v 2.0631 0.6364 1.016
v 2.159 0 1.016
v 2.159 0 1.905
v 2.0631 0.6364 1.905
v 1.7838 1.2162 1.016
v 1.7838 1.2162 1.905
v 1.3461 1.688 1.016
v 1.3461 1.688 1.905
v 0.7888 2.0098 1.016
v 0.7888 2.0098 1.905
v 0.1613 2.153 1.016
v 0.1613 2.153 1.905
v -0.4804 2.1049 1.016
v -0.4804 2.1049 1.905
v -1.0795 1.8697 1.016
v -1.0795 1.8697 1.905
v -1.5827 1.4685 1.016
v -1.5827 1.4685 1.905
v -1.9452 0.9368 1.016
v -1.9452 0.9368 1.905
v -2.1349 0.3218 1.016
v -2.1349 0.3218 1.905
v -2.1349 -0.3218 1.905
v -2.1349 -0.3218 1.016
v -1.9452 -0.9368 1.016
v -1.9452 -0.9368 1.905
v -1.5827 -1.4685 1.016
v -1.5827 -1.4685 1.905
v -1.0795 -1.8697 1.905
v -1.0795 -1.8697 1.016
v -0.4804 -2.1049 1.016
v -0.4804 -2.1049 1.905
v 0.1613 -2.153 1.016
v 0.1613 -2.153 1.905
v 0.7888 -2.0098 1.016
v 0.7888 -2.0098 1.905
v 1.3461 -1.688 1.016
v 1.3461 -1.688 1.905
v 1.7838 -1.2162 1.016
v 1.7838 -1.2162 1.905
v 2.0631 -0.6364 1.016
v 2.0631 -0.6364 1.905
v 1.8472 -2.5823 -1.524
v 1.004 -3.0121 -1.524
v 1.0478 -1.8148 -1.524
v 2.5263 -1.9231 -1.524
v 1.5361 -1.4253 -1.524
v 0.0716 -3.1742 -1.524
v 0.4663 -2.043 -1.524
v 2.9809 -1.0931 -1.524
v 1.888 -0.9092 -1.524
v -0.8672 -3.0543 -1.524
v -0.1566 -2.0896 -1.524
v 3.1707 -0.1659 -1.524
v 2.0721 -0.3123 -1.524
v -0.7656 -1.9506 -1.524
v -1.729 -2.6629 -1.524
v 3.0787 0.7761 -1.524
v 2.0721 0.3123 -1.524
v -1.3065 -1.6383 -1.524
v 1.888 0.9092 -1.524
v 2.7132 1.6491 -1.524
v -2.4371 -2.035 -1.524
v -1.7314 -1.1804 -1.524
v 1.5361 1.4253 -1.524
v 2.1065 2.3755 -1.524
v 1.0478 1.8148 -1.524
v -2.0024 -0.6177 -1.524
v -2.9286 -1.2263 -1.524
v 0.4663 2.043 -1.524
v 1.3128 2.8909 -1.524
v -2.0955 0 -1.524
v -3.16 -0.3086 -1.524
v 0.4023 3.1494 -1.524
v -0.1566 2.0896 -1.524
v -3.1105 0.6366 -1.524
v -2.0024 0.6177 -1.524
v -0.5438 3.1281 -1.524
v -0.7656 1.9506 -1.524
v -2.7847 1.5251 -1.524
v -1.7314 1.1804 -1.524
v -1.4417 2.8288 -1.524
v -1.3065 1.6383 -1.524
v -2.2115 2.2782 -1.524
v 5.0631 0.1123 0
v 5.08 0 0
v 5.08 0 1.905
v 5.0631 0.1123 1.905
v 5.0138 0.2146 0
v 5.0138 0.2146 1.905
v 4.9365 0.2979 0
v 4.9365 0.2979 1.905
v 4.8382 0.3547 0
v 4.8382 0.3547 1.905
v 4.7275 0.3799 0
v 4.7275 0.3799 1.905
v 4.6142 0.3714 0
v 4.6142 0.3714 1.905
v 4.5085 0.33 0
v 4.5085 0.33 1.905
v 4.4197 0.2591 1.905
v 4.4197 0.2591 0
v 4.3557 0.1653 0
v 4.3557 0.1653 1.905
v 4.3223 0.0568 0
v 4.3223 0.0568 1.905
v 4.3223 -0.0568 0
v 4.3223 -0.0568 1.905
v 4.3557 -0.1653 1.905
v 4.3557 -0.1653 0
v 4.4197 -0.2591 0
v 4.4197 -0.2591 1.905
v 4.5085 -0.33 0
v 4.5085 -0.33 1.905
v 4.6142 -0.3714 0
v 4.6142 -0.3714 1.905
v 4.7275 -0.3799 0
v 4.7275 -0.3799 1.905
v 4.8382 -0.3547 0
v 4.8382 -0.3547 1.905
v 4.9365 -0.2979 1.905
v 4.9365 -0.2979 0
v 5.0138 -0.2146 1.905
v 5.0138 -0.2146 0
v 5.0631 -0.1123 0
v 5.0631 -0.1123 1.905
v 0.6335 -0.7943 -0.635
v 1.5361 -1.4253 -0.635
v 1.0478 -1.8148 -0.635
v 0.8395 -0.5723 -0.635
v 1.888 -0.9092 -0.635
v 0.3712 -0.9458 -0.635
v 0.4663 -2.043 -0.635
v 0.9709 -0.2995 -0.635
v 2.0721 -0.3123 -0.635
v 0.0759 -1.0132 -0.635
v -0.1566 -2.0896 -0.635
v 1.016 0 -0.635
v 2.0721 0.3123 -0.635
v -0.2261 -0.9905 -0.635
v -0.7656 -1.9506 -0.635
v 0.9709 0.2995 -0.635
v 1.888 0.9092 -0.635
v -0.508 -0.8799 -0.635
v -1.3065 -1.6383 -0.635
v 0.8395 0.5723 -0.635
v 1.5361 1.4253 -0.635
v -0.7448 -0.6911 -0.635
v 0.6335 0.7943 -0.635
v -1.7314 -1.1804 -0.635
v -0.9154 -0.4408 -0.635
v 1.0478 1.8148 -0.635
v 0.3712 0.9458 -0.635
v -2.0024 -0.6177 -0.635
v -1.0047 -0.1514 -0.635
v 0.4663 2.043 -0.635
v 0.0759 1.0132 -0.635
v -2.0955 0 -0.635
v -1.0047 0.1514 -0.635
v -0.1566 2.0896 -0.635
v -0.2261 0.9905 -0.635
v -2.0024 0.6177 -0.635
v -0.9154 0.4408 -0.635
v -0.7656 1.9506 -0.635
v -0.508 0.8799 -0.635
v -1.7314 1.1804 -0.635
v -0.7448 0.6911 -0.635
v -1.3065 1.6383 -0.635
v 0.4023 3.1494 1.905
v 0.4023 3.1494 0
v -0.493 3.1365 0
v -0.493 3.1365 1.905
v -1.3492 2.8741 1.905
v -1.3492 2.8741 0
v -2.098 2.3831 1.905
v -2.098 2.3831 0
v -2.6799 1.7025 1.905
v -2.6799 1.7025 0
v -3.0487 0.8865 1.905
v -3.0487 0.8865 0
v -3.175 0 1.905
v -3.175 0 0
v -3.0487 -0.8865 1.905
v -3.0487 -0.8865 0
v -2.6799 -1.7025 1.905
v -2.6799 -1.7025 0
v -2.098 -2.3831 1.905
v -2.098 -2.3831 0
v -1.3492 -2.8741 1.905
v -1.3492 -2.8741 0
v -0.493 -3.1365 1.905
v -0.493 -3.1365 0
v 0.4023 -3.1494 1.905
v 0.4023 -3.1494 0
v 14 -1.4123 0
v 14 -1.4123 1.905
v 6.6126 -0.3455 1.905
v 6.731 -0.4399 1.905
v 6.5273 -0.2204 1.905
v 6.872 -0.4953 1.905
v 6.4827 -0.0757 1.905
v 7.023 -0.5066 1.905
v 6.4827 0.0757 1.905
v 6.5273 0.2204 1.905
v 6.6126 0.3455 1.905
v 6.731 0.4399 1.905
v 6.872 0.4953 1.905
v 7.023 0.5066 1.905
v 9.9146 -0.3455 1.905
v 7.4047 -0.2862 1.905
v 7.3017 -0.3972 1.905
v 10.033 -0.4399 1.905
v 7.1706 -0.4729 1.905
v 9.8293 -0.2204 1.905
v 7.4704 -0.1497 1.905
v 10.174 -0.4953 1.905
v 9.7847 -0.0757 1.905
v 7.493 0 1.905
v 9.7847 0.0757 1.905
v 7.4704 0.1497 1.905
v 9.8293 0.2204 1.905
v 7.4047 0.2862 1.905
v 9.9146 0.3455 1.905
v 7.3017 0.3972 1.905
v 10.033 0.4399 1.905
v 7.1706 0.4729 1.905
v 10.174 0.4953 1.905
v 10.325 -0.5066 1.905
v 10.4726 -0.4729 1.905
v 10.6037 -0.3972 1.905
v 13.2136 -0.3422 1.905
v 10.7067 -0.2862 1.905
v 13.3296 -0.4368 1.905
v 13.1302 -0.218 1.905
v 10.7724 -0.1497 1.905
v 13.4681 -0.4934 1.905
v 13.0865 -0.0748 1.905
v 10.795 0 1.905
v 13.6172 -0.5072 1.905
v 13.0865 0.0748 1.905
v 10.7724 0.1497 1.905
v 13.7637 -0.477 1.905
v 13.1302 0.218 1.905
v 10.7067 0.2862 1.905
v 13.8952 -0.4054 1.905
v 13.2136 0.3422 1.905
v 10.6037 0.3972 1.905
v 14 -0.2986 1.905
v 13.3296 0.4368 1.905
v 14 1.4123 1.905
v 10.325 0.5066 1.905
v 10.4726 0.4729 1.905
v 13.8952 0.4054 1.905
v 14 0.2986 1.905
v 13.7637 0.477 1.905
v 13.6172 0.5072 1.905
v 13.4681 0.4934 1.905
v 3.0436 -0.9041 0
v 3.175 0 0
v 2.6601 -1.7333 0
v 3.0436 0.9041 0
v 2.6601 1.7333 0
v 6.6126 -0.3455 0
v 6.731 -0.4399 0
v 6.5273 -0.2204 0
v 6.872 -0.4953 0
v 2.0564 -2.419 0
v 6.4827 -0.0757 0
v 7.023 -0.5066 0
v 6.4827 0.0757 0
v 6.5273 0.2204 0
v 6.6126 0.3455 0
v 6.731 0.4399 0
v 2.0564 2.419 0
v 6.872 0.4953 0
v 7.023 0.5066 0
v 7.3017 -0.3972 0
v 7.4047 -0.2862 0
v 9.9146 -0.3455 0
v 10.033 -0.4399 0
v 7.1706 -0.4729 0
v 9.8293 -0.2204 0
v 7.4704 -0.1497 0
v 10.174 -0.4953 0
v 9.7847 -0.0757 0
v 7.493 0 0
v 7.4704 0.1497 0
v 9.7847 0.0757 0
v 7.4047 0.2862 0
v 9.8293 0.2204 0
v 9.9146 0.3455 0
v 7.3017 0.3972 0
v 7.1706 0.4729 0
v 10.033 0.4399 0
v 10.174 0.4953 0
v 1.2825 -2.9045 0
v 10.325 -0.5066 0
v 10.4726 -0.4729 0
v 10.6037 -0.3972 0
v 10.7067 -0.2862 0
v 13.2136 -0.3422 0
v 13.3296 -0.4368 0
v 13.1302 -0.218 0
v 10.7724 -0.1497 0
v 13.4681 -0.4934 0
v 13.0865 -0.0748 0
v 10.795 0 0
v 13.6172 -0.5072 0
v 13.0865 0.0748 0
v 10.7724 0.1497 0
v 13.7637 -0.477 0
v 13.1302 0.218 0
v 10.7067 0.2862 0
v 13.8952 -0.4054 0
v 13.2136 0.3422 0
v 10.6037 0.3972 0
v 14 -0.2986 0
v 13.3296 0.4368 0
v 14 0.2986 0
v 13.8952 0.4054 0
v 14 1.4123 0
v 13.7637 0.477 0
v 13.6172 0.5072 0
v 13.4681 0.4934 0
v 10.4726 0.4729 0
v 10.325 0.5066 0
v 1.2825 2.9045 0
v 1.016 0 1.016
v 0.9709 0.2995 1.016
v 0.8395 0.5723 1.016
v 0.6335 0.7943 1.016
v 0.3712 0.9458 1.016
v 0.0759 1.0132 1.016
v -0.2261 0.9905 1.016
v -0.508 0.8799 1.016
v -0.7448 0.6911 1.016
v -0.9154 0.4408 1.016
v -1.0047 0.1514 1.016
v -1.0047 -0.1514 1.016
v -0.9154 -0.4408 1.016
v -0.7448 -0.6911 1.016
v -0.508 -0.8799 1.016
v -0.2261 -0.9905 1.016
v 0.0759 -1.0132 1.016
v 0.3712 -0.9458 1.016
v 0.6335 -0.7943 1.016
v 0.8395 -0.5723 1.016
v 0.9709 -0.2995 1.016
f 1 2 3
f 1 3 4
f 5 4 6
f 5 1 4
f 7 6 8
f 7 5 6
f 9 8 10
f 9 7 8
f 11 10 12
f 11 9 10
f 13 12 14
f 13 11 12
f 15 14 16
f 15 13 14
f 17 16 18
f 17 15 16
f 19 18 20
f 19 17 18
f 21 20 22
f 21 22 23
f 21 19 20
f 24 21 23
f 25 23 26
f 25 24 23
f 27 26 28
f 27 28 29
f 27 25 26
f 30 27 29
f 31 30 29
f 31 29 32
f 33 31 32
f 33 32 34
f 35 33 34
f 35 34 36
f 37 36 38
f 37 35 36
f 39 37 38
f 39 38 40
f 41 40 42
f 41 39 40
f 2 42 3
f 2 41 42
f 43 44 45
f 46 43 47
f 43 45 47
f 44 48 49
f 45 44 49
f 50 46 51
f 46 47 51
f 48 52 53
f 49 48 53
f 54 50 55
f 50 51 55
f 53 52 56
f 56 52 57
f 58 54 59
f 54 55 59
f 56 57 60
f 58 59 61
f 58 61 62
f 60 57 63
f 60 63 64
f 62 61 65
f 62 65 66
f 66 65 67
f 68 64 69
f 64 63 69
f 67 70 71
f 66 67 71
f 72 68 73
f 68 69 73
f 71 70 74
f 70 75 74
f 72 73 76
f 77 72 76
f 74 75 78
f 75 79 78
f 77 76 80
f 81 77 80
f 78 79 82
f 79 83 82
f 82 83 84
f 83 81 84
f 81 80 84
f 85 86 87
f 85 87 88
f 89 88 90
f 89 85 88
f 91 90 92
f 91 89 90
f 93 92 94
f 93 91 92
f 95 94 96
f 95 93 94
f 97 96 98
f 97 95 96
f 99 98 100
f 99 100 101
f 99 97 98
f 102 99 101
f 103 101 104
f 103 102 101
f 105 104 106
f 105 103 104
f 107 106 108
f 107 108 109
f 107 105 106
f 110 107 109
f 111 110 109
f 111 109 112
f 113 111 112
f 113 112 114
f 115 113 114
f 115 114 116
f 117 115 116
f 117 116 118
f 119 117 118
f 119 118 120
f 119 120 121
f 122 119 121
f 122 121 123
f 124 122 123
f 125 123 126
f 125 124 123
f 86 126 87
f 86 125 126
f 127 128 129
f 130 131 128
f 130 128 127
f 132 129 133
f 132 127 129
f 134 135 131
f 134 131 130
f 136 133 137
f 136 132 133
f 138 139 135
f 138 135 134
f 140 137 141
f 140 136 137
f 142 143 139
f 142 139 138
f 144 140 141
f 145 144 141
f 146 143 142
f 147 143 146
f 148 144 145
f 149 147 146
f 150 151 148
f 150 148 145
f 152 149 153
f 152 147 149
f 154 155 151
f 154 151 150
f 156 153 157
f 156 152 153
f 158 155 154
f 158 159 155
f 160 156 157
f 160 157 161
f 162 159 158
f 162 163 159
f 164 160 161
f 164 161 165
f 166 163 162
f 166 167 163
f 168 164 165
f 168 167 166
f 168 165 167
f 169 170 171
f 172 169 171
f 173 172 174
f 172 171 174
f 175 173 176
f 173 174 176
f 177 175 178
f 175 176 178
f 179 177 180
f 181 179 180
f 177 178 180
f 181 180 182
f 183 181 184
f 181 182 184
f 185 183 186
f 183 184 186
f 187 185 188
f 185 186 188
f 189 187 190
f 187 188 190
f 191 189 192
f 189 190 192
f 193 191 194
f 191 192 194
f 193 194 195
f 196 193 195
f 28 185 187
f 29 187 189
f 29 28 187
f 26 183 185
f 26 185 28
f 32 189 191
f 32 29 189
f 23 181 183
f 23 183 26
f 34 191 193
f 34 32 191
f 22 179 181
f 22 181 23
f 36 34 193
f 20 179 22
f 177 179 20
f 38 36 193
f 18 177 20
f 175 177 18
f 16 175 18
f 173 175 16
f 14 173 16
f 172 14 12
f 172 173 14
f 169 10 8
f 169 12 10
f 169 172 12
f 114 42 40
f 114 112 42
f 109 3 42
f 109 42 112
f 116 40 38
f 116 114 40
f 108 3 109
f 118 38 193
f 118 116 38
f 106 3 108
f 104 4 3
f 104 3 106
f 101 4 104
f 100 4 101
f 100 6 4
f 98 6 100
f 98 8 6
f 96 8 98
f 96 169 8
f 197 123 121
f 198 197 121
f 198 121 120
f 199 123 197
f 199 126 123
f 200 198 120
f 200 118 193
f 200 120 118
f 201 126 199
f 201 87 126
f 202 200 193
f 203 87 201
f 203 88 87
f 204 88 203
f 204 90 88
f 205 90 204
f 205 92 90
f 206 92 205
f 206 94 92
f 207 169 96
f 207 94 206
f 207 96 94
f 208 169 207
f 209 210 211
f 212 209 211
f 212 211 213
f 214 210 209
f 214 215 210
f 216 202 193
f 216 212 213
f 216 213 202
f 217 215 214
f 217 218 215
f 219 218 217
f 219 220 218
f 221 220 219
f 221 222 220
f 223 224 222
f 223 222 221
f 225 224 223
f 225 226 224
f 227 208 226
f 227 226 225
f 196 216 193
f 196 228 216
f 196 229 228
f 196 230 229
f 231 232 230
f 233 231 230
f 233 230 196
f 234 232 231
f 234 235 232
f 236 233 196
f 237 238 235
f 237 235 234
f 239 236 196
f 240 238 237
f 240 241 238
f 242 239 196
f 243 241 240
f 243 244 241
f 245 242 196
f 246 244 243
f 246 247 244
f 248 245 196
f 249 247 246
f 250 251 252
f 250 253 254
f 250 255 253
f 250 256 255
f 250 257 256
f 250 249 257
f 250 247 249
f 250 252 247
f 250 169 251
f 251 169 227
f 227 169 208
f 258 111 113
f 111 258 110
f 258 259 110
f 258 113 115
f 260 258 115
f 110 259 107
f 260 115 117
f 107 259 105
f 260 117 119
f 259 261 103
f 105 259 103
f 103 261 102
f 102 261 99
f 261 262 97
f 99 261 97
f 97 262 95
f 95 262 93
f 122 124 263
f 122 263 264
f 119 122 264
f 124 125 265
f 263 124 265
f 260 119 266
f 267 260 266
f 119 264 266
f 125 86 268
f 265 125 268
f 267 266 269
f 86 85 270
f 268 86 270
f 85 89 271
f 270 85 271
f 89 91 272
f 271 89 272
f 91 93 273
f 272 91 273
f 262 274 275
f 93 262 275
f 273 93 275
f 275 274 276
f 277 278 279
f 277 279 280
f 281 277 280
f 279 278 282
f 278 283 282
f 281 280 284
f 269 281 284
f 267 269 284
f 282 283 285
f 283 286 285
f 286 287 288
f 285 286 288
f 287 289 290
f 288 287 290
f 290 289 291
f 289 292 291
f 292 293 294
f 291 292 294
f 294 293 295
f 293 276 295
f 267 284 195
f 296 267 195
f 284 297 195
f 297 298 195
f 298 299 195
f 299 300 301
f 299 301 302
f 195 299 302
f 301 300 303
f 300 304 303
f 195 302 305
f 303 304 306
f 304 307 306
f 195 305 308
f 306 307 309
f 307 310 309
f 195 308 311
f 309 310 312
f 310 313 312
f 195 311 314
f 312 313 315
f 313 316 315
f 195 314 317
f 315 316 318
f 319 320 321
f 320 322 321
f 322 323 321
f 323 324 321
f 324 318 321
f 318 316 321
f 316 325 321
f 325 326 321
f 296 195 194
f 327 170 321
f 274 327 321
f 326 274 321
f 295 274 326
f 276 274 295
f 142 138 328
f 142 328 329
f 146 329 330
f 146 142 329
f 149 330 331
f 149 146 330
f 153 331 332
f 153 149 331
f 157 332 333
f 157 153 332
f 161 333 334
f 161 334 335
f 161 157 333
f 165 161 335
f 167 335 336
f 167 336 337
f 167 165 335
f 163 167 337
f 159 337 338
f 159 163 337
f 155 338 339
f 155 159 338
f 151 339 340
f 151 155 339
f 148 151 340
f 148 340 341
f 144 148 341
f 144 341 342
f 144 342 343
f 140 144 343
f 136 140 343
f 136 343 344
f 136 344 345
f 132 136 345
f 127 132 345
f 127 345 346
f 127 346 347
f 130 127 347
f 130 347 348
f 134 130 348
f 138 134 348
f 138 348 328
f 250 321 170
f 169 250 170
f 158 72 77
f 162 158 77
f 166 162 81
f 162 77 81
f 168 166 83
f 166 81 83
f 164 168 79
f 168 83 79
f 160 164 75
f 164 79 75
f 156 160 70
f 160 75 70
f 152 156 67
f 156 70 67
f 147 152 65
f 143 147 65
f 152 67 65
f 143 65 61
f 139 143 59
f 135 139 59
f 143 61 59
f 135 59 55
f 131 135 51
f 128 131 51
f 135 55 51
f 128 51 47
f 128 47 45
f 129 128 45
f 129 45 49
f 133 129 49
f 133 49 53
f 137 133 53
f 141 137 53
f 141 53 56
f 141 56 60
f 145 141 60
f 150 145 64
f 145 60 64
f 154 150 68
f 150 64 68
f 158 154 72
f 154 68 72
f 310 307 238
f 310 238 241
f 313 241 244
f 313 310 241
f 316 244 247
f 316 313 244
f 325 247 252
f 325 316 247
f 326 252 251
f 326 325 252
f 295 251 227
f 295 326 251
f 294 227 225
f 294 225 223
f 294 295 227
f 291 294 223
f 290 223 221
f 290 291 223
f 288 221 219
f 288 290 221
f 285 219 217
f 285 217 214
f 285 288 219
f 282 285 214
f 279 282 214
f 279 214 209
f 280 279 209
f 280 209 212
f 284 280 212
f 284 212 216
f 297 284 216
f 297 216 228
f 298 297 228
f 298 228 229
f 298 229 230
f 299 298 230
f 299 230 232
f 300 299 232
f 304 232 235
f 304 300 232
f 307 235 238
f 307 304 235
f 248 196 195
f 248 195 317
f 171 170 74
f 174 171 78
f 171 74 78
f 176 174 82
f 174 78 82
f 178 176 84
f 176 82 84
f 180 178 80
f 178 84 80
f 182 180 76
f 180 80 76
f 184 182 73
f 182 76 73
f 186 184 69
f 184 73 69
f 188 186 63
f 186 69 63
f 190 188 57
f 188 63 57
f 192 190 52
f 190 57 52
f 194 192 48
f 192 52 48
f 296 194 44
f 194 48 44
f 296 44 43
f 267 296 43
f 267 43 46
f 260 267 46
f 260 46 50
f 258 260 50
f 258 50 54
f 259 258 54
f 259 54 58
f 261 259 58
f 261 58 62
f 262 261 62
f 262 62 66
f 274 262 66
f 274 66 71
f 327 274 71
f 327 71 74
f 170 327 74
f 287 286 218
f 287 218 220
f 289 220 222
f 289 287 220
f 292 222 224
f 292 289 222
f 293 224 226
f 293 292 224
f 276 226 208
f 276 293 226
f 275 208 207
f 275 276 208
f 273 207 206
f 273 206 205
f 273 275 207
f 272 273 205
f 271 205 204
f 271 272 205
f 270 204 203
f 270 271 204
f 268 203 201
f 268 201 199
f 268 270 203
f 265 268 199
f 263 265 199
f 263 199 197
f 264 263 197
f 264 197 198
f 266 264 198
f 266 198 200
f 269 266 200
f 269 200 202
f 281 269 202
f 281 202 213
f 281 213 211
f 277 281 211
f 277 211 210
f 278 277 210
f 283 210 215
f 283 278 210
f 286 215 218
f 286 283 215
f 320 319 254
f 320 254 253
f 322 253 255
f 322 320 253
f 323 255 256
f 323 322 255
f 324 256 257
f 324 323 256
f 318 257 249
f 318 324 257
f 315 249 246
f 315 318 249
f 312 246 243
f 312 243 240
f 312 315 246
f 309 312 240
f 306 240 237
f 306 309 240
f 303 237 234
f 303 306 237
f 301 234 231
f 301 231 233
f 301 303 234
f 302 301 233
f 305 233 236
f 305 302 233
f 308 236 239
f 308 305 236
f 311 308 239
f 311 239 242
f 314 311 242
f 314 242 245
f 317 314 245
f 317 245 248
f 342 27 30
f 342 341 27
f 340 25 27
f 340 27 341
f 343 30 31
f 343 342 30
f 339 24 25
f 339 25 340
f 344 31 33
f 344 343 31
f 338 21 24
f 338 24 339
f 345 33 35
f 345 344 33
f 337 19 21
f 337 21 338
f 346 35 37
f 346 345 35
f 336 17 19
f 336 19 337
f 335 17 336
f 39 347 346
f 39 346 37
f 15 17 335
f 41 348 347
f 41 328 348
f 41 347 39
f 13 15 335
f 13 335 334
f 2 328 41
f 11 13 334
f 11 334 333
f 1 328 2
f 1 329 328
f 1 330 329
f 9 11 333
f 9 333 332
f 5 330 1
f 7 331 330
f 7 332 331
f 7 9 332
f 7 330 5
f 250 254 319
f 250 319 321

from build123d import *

# Parameters (mm, degrees)
SKETCH1_R               = 0.508
SKETCH1_R_2             = 0.381
SKETCH1_R_3             = 1.016
BOSS_EXTRUDE1_DEPTH     = 1.905
BOSS_EXTRUDE2_START     = -1.524
SKETCH1_3_R             = 3.175
SKETCH1_3_R_2           = 1.016
BOSS_EXTRUDE2_DEPTH     = 1.524
CUT_EXTRUDE1_START      = -0.889
SKETCH2_R               = 2.158999876
SKETCH2_R_2             = 1.016
CUT_EXTRUDE1_DEPTH      = 0.889
SKETCH4_R               = 2.095500003
SKETCH4_R_2             = 1.016
CUT_EXTRUDE2_DEPTH      = 0.889
CUT_EXTRUDE3_DEPTH      = 19.858264168
CUT_EXTRUDE3_DEPTH_BACK = 19.858264168
SKETCH5_R               = 0.508


with BuildPart() as part:
    # Sketch1 → Boss-Extrude1 (new body)
    with BuildSketch(Plane.XY):
        with BuildLine():
            Line((17.659400579, 0.944821475), (0.402335264, 3.149404918))
            ThreePointArc((0.402335264, 3.149404918), (-3.175, 0), (0.402335264, -3.149404918))
            Line((0.402335264, -3.149404918), (17.659400579, -0.944821475))
            ThreePointArc((17.659400579, -0.944821475), (18.4912, 0), (17.659400579, 0.944821475))
        make_face()
        with Locations((16.891, 0)):
            Circle(SKETCH1_R, mode=Mode.SUBTRACT)
        with Locations((4.699, 0)):
            Circle(SKETCH1_R_2, mode=Mode.SUBTRACT)
        with Locations((6.985, 0)):
            Circle(SKETCH1_R, mode=Mode.SUBTRACT)
        with Locations((10.287, 0)):
            Circle(SKETCH1_R, mode=Mode.SUBTRACT)
        with Locations((13.589, 0)):
            Circle(SKETCH1_R, mode=Mode.SUBTRACT)
        Circle(SKETCH1_R_3, mode=Mode.SUBTRACT)
    extrude(amount=BOSS_EXTRUDE1_DEPTH)

    # Sketch1<3> → Boss-Extrude2 (add)
    with BuildSketch(Plane.XY.offset(BOSS_EXTRUDE2_START)):
        with Locations(Location((0, 0, 0), (0, 0, 82.719918909))):
            Circle(SKETCH1_3_R)
        Circle(SKETCH1_3_R_2, mode=Mode.SUBTRACT)
    extrude(amount=BOSS_EXTRUDE2_DEPTH)

    # Sketch2 → Cut-Extrude1 (cut)
    with BuildSketch(Plane.XY.offset(1.905).offset(CUT_EXTRUDE1_START)):
        Circle(SKETCH2_R)
        Circle(SKETCH2_R_2, mode=Mode.SUBTRACT)
    extrude(amount=CUT_EXTRUDE1_DEPTH, mode=Mode.SUBTRACT)

    # Sketch4 → Cut-Extrude2 (cut)
    with BuildSketch(Plane(origin=(0, 0, -1.524), x_dir=(-1, 0, 0), z_dir=(0, 0, -1))):
        Circle(SKETCH4_R)
        Circle(SKETCH4_R_2, mode=Mode.SUBTRACT)
    extrude(amount=-CUT_EXTRUDE2_DEPTH, mode=Mode.SUBTRACT)

    # Sketch5 → Cut-Extrude3 (cut, two sides: drawn at the far end of the back side and taken through both)
    # profile 1 of 2: a face of its own
    with BuildSketch(Plane(origin=(0, 0, 0), x_dir=(-1, 0, 0), z_dir=(0, 0, -1)).offset(-CUT_EXTRUDE3_DEPTH_BACK)):
        with BuildLine():
            Line((-17.659400579, -0.944821475), (-14, -1.412308489))
            Line((-14, -1.412308489), (-14, -0.29856825))
            ThreePointArc((-14, -0.29856825), (-14.097, 0), (-14, 0.29856825))
            Line((-14, 0.29856825), (-14, 1.412308489))
            Line((-14, 1.412308489), (-17.659400579, 0.944821475))
            ThreePointArc((-17.659400579, 0.944821475), (-18.4912, 0), (-17.659400579, -0.944821475))
        make_face()
        with Locations((-16.891, 0)):
            Circle(SKETCH5_R, mode=Mode.SUBTRACT)
    # profile 2 of 2: a face of its own
    with BuildSketch(Plane(origin=(0, 0, 0), x_dir=(-1, 0, 0), z_dir=(0, 0, -1)).offset(-CUT_EXTRUDE3_DEPTH_BACK)):
        with Locations((-16.891, 0)):
            Circle(SKETCH5_R)
    extrude(amount=CUT_EXTRUDE3_DEPTH + CUT_EXTRUDE3_DEPTH_BACK, mode=Mode.SUBTRACT)


solid = part.part
